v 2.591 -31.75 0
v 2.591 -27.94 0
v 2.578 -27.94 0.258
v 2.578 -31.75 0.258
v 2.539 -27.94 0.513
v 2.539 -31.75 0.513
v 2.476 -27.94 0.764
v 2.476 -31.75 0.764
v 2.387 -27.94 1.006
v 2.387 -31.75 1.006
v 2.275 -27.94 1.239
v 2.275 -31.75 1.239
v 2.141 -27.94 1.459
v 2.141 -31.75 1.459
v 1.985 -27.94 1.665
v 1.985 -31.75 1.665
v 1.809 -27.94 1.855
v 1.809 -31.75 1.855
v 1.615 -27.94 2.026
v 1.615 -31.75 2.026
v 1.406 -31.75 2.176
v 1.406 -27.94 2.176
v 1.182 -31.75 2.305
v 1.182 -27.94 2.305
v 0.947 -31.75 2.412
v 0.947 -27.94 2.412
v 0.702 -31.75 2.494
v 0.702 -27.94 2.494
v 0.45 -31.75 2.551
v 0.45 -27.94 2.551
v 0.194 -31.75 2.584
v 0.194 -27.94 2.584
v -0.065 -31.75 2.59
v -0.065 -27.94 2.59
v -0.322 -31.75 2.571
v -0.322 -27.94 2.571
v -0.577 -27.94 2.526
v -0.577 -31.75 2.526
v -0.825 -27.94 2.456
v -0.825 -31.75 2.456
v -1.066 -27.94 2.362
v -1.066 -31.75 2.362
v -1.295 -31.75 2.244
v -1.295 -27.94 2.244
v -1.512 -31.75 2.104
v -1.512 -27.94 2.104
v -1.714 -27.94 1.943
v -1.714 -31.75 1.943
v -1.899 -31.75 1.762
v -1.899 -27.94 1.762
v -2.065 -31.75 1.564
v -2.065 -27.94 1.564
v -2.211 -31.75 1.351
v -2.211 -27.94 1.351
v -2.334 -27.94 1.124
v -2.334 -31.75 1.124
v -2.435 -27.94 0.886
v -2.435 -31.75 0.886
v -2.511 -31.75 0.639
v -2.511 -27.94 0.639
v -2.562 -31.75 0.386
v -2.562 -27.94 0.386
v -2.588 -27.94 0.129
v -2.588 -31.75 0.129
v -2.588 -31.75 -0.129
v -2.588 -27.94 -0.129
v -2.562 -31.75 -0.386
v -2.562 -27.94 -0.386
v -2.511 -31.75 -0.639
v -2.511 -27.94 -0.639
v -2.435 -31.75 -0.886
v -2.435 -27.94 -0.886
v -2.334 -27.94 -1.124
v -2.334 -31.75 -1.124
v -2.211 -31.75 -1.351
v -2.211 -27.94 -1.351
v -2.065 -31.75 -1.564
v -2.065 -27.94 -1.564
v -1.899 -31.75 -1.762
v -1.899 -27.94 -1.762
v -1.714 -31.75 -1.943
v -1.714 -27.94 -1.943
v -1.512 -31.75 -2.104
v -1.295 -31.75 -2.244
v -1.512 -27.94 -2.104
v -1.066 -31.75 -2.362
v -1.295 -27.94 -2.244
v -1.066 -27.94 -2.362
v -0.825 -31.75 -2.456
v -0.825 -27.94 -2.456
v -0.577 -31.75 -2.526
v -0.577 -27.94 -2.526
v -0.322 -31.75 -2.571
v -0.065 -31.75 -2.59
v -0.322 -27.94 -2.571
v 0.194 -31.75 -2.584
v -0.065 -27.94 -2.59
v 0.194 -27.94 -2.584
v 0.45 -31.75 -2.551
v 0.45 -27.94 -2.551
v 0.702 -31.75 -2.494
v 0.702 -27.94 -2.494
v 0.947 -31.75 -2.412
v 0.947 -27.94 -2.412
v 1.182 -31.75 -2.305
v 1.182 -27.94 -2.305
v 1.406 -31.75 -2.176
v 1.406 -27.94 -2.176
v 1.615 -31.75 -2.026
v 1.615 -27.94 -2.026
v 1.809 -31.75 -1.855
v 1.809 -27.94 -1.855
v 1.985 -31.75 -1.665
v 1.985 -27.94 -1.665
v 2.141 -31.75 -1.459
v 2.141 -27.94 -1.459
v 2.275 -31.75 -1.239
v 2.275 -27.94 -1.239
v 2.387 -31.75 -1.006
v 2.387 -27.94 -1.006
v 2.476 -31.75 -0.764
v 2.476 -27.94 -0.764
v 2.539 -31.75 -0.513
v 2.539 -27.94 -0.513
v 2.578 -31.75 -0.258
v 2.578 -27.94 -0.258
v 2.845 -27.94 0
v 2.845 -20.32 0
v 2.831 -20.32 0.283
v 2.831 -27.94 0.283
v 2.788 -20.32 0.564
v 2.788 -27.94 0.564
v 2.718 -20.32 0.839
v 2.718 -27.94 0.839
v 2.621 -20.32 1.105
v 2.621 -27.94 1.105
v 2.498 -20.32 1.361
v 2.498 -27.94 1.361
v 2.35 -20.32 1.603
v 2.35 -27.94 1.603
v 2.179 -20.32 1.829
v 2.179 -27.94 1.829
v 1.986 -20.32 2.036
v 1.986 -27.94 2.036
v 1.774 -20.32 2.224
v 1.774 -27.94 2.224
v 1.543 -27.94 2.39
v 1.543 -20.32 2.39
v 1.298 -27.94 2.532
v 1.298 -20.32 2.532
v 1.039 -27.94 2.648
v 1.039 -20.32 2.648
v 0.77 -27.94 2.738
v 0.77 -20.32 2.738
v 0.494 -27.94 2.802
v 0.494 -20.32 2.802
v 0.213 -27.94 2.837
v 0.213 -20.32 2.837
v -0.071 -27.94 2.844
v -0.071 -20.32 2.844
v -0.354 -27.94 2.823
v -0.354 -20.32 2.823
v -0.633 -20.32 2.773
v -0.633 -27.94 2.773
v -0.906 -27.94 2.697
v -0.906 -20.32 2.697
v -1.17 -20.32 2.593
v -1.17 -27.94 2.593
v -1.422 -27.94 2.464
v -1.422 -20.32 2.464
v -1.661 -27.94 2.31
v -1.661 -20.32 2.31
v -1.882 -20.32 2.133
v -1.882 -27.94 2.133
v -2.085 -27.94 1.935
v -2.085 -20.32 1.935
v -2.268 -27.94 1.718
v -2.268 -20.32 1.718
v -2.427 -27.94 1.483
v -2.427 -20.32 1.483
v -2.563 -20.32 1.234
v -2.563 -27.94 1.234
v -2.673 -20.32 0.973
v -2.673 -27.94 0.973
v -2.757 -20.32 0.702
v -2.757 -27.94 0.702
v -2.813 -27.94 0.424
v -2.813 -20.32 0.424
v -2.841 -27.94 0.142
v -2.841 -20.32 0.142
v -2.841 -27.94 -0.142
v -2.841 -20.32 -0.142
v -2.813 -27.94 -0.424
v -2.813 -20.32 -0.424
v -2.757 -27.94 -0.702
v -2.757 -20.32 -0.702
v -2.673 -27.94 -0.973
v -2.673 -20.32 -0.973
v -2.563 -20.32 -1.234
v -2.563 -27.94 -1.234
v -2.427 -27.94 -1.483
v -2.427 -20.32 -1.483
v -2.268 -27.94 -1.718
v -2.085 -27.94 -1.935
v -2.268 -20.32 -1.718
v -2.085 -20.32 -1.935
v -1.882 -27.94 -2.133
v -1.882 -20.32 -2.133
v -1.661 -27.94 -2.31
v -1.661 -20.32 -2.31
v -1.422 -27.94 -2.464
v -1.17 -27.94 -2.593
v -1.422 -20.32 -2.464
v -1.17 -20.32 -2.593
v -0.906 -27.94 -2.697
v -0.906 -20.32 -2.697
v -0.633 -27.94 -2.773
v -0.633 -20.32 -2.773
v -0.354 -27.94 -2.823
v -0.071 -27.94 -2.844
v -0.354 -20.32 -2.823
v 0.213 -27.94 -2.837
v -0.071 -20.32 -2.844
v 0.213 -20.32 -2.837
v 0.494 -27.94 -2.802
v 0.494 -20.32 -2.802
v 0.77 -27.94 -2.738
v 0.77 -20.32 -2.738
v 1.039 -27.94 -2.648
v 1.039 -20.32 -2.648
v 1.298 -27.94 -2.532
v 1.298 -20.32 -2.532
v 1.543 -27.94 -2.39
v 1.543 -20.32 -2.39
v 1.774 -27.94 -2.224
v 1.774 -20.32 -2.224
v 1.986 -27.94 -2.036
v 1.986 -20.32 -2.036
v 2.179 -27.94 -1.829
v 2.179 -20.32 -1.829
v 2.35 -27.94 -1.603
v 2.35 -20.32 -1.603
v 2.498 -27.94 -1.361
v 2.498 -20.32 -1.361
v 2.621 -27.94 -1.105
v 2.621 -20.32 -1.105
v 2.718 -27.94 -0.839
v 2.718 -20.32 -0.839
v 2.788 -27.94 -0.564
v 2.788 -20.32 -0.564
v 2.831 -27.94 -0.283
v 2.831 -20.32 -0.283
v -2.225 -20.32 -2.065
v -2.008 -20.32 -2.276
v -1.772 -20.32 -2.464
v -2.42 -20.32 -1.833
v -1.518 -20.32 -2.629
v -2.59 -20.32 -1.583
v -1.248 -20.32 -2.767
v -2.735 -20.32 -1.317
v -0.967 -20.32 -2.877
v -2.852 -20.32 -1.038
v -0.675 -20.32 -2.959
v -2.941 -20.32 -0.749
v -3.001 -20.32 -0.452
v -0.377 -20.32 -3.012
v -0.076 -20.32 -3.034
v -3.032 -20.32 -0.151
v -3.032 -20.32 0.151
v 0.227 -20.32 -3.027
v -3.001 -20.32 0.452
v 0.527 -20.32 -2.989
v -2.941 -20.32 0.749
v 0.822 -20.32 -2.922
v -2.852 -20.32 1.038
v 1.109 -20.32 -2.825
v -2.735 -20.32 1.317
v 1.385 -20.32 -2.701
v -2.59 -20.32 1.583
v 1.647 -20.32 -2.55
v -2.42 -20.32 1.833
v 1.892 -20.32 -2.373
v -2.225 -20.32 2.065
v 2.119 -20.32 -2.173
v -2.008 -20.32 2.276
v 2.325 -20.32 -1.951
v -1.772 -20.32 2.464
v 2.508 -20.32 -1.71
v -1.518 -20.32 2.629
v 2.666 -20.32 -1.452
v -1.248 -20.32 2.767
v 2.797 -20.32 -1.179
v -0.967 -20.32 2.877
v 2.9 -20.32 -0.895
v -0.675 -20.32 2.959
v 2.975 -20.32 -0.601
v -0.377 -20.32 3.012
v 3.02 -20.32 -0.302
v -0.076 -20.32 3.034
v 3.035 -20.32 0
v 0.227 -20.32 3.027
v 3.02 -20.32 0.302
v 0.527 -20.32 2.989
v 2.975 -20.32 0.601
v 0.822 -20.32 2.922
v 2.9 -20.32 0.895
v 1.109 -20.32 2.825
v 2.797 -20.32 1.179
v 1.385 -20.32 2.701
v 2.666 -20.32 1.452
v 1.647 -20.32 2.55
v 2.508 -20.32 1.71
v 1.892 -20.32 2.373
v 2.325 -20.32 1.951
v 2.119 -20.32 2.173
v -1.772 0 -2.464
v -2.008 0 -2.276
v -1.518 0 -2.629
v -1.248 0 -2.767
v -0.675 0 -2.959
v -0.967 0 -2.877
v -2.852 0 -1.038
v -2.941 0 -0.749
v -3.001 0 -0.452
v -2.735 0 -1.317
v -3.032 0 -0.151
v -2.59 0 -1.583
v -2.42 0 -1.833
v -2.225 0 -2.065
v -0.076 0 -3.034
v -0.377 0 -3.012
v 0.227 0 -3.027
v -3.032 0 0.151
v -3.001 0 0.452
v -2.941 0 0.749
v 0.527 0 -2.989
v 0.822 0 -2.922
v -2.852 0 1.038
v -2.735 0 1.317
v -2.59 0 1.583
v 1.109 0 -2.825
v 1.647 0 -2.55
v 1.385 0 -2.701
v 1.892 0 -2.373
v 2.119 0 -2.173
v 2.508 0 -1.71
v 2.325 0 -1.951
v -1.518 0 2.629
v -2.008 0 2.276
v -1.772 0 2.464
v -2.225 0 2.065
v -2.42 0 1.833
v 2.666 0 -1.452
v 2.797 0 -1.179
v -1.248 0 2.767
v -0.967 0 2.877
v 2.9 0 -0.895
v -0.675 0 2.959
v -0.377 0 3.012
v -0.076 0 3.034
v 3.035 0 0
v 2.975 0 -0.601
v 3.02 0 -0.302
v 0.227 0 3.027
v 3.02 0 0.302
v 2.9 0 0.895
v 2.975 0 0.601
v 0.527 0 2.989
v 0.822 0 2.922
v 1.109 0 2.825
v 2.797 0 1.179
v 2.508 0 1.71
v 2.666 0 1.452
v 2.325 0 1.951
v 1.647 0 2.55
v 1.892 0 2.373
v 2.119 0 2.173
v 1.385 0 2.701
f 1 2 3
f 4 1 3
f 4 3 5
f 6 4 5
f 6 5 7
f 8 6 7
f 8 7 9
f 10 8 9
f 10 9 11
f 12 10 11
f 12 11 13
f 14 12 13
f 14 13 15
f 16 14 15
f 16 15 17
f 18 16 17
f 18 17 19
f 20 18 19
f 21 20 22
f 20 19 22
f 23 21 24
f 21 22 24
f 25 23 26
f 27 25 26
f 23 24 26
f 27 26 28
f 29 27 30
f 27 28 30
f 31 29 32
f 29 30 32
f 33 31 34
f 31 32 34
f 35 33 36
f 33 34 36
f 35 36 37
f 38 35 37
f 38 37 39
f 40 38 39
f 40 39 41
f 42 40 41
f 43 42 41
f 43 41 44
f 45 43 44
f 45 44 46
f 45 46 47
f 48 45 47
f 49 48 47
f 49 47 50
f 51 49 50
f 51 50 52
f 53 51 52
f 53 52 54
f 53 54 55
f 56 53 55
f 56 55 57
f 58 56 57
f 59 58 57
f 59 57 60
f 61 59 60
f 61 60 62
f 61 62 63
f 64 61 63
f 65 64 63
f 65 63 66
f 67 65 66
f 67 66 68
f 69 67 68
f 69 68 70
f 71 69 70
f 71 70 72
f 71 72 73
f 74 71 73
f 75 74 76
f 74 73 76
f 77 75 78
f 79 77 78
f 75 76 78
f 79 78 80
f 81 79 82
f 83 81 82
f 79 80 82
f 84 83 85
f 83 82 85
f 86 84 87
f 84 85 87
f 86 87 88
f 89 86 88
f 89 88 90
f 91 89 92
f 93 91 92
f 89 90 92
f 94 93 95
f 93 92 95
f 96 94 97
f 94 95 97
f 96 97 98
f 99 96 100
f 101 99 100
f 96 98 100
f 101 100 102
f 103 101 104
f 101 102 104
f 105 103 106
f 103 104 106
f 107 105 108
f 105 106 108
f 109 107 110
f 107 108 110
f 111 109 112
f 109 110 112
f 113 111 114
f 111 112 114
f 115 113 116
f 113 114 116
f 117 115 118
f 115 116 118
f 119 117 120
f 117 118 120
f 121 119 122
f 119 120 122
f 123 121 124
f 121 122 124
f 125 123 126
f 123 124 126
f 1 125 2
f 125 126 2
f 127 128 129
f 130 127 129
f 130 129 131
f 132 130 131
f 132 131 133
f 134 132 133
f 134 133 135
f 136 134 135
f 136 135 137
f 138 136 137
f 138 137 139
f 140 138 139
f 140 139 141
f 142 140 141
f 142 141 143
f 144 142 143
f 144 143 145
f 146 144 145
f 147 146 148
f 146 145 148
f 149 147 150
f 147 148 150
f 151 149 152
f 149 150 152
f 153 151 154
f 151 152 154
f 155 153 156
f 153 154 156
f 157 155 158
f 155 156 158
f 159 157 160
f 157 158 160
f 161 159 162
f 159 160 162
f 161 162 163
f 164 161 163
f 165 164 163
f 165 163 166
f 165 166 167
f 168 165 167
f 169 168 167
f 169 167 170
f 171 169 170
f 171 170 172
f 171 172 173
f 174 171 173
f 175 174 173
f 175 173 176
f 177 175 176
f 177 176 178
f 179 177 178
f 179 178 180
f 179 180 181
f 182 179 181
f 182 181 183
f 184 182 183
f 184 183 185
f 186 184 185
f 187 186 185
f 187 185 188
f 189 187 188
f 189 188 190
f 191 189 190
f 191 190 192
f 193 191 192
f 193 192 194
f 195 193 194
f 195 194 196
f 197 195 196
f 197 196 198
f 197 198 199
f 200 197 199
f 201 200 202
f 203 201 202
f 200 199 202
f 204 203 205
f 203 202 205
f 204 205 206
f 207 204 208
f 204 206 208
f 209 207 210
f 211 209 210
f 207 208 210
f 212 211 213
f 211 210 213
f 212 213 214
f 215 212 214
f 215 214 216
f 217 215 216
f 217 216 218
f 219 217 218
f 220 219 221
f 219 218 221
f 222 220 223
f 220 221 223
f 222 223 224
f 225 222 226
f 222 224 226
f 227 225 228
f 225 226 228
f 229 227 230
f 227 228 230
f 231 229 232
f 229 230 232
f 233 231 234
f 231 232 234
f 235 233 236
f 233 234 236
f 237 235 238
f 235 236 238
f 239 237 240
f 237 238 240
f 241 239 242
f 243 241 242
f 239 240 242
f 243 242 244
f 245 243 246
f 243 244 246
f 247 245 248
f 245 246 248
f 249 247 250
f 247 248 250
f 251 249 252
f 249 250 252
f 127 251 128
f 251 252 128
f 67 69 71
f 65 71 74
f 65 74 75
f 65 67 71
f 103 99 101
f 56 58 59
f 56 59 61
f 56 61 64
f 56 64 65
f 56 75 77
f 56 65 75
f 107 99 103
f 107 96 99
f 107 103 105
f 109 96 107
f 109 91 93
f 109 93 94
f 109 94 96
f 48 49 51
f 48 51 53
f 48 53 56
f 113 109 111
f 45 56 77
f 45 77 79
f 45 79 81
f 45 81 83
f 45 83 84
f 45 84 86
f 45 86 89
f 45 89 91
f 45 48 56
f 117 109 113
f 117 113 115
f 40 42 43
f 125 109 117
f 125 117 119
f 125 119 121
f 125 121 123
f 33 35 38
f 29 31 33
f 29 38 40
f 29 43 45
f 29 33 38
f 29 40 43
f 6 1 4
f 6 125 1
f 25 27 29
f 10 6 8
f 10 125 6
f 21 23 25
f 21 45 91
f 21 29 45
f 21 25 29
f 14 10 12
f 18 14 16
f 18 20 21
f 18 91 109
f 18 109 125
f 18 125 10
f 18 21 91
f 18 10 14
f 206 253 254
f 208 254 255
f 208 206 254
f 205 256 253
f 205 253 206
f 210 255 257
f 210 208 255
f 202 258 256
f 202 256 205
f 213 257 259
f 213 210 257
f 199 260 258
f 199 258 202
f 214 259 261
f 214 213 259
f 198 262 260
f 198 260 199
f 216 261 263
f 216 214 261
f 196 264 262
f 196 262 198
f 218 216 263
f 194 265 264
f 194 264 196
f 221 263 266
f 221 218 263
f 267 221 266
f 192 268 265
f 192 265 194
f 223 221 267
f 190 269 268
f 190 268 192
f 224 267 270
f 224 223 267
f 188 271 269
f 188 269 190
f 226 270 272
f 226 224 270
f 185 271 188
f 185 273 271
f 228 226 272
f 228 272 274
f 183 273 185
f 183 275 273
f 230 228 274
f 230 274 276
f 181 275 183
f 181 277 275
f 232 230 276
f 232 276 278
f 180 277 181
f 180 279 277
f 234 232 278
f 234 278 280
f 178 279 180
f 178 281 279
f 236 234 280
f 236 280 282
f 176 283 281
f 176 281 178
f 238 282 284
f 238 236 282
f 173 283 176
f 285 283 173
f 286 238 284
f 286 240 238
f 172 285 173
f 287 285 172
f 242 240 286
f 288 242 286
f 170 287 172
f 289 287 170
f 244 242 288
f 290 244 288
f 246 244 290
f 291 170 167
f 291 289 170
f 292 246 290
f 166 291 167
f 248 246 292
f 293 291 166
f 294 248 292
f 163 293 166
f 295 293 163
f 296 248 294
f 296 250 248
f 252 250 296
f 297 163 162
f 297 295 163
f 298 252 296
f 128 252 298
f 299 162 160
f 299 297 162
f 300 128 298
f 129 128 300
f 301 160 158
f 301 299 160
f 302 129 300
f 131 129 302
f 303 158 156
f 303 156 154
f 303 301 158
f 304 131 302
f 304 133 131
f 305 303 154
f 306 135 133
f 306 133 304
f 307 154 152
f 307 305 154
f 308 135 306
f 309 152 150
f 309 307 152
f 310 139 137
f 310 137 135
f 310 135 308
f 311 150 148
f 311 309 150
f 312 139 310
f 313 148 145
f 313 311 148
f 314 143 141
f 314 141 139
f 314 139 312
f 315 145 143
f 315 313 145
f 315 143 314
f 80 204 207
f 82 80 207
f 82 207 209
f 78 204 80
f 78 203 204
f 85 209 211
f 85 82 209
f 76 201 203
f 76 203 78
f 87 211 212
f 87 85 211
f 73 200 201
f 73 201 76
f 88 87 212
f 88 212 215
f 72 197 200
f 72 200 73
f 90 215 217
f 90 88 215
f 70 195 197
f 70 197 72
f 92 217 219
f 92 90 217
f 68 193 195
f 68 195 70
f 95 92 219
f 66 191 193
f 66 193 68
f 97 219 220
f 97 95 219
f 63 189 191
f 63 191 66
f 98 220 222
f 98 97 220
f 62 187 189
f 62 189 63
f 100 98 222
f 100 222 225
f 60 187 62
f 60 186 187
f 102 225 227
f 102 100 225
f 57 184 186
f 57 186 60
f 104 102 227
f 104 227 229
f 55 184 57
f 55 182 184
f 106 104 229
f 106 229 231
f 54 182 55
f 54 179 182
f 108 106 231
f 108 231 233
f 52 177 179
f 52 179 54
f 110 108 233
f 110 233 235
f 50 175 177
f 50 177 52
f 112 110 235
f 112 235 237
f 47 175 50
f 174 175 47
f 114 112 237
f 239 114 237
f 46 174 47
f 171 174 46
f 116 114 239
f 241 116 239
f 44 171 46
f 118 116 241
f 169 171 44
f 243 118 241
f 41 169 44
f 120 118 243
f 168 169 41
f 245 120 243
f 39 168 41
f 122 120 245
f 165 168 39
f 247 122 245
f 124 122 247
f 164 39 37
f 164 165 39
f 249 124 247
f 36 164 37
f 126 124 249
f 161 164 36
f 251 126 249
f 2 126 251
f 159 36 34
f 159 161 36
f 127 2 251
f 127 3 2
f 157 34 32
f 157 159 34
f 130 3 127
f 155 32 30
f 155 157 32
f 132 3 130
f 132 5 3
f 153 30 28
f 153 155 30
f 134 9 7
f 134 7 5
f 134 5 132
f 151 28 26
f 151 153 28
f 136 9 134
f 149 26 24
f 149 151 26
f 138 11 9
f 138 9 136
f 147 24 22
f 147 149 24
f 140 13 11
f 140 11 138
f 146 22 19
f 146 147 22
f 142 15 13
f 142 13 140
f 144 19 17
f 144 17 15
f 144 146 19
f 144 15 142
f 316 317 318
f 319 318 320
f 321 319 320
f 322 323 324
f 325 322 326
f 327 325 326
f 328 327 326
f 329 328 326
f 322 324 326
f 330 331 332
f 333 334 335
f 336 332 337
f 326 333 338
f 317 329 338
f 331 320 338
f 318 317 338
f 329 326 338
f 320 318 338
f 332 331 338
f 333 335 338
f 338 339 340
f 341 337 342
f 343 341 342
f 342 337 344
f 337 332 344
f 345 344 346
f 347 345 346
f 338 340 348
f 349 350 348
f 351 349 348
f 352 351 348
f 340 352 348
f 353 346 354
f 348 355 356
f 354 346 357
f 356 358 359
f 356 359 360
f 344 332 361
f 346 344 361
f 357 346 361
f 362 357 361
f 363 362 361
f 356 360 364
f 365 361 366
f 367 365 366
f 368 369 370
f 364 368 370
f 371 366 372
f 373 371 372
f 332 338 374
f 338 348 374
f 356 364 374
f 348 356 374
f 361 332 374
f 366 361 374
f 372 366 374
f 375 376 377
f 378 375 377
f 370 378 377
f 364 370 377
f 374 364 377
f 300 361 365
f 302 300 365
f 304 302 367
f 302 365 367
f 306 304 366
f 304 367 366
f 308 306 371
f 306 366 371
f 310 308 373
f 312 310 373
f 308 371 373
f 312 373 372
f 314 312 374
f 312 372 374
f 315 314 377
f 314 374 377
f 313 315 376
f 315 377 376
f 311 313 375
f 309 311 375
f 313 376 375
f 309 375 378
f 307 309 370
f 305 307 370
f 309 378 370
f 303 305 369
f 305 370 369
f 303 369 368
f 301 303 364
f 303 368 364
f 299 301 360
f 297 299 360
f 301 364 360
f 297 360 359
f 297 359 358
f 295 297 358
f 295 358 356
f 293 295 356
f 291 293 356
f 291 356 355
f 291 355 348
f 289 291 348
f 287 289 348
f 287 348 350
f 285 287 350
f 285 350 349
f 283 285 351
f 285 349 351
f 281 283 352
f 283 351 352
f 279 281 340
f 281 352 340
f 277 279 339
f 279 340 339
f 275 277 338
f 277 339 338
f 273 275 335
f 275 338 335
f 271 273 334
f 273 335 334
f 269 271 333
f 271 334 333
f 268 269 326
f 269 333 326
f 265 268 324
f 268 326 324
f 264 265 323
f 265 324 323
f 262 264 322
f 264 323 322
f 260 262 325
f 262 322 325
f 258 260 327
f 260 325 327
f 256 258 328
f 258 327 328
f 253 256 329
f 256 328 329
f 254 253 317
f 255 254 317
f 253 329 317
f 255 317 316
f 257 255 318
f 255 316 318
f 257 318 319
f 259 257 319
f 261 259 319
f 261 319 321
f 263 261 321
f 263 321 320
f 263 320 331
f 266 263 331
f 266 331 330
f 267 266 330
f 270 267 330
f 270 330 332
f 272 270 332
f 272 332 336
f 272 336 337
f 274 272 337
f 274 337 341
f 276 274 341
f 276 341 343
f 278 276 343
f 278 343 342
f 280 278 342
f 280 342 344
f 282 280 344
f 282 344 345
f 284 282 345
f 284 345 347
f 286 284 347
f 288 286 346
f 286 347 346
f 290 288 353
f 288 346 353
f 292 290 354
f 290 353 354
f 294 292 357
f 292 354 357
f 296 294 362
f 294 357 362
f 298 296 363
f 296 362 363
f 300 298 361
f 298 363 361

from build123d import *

# Parameters (mm, degrees)
F0_R     = 2.5908
F3_DEPTH = 31.75
F1_R     = 2.8448
F4_DEPTH = 27.94
F2_R     = 3.0353
F5_DEPTH = 20.32


with BuildPart() as f3:
    # F0 (on Front) → F3 (new body)
    with BuildSketch(Plane.XZ):
        Circle(F0_R)
    extrude(amount=F3_DEPTH)

    # F1 (on Front) → F4 (join)
    with BuildSketch(Plane.XZ):
        Circle(F1_R)
    extrude(amount=F4_DEPTH)

    # F2 (on Front) → F5 (join)
    with BuildSketch(Plane.XZ):
        Circle(F2_R)
    extrude(amount=F5_DEPTH)


solid = f3.part
